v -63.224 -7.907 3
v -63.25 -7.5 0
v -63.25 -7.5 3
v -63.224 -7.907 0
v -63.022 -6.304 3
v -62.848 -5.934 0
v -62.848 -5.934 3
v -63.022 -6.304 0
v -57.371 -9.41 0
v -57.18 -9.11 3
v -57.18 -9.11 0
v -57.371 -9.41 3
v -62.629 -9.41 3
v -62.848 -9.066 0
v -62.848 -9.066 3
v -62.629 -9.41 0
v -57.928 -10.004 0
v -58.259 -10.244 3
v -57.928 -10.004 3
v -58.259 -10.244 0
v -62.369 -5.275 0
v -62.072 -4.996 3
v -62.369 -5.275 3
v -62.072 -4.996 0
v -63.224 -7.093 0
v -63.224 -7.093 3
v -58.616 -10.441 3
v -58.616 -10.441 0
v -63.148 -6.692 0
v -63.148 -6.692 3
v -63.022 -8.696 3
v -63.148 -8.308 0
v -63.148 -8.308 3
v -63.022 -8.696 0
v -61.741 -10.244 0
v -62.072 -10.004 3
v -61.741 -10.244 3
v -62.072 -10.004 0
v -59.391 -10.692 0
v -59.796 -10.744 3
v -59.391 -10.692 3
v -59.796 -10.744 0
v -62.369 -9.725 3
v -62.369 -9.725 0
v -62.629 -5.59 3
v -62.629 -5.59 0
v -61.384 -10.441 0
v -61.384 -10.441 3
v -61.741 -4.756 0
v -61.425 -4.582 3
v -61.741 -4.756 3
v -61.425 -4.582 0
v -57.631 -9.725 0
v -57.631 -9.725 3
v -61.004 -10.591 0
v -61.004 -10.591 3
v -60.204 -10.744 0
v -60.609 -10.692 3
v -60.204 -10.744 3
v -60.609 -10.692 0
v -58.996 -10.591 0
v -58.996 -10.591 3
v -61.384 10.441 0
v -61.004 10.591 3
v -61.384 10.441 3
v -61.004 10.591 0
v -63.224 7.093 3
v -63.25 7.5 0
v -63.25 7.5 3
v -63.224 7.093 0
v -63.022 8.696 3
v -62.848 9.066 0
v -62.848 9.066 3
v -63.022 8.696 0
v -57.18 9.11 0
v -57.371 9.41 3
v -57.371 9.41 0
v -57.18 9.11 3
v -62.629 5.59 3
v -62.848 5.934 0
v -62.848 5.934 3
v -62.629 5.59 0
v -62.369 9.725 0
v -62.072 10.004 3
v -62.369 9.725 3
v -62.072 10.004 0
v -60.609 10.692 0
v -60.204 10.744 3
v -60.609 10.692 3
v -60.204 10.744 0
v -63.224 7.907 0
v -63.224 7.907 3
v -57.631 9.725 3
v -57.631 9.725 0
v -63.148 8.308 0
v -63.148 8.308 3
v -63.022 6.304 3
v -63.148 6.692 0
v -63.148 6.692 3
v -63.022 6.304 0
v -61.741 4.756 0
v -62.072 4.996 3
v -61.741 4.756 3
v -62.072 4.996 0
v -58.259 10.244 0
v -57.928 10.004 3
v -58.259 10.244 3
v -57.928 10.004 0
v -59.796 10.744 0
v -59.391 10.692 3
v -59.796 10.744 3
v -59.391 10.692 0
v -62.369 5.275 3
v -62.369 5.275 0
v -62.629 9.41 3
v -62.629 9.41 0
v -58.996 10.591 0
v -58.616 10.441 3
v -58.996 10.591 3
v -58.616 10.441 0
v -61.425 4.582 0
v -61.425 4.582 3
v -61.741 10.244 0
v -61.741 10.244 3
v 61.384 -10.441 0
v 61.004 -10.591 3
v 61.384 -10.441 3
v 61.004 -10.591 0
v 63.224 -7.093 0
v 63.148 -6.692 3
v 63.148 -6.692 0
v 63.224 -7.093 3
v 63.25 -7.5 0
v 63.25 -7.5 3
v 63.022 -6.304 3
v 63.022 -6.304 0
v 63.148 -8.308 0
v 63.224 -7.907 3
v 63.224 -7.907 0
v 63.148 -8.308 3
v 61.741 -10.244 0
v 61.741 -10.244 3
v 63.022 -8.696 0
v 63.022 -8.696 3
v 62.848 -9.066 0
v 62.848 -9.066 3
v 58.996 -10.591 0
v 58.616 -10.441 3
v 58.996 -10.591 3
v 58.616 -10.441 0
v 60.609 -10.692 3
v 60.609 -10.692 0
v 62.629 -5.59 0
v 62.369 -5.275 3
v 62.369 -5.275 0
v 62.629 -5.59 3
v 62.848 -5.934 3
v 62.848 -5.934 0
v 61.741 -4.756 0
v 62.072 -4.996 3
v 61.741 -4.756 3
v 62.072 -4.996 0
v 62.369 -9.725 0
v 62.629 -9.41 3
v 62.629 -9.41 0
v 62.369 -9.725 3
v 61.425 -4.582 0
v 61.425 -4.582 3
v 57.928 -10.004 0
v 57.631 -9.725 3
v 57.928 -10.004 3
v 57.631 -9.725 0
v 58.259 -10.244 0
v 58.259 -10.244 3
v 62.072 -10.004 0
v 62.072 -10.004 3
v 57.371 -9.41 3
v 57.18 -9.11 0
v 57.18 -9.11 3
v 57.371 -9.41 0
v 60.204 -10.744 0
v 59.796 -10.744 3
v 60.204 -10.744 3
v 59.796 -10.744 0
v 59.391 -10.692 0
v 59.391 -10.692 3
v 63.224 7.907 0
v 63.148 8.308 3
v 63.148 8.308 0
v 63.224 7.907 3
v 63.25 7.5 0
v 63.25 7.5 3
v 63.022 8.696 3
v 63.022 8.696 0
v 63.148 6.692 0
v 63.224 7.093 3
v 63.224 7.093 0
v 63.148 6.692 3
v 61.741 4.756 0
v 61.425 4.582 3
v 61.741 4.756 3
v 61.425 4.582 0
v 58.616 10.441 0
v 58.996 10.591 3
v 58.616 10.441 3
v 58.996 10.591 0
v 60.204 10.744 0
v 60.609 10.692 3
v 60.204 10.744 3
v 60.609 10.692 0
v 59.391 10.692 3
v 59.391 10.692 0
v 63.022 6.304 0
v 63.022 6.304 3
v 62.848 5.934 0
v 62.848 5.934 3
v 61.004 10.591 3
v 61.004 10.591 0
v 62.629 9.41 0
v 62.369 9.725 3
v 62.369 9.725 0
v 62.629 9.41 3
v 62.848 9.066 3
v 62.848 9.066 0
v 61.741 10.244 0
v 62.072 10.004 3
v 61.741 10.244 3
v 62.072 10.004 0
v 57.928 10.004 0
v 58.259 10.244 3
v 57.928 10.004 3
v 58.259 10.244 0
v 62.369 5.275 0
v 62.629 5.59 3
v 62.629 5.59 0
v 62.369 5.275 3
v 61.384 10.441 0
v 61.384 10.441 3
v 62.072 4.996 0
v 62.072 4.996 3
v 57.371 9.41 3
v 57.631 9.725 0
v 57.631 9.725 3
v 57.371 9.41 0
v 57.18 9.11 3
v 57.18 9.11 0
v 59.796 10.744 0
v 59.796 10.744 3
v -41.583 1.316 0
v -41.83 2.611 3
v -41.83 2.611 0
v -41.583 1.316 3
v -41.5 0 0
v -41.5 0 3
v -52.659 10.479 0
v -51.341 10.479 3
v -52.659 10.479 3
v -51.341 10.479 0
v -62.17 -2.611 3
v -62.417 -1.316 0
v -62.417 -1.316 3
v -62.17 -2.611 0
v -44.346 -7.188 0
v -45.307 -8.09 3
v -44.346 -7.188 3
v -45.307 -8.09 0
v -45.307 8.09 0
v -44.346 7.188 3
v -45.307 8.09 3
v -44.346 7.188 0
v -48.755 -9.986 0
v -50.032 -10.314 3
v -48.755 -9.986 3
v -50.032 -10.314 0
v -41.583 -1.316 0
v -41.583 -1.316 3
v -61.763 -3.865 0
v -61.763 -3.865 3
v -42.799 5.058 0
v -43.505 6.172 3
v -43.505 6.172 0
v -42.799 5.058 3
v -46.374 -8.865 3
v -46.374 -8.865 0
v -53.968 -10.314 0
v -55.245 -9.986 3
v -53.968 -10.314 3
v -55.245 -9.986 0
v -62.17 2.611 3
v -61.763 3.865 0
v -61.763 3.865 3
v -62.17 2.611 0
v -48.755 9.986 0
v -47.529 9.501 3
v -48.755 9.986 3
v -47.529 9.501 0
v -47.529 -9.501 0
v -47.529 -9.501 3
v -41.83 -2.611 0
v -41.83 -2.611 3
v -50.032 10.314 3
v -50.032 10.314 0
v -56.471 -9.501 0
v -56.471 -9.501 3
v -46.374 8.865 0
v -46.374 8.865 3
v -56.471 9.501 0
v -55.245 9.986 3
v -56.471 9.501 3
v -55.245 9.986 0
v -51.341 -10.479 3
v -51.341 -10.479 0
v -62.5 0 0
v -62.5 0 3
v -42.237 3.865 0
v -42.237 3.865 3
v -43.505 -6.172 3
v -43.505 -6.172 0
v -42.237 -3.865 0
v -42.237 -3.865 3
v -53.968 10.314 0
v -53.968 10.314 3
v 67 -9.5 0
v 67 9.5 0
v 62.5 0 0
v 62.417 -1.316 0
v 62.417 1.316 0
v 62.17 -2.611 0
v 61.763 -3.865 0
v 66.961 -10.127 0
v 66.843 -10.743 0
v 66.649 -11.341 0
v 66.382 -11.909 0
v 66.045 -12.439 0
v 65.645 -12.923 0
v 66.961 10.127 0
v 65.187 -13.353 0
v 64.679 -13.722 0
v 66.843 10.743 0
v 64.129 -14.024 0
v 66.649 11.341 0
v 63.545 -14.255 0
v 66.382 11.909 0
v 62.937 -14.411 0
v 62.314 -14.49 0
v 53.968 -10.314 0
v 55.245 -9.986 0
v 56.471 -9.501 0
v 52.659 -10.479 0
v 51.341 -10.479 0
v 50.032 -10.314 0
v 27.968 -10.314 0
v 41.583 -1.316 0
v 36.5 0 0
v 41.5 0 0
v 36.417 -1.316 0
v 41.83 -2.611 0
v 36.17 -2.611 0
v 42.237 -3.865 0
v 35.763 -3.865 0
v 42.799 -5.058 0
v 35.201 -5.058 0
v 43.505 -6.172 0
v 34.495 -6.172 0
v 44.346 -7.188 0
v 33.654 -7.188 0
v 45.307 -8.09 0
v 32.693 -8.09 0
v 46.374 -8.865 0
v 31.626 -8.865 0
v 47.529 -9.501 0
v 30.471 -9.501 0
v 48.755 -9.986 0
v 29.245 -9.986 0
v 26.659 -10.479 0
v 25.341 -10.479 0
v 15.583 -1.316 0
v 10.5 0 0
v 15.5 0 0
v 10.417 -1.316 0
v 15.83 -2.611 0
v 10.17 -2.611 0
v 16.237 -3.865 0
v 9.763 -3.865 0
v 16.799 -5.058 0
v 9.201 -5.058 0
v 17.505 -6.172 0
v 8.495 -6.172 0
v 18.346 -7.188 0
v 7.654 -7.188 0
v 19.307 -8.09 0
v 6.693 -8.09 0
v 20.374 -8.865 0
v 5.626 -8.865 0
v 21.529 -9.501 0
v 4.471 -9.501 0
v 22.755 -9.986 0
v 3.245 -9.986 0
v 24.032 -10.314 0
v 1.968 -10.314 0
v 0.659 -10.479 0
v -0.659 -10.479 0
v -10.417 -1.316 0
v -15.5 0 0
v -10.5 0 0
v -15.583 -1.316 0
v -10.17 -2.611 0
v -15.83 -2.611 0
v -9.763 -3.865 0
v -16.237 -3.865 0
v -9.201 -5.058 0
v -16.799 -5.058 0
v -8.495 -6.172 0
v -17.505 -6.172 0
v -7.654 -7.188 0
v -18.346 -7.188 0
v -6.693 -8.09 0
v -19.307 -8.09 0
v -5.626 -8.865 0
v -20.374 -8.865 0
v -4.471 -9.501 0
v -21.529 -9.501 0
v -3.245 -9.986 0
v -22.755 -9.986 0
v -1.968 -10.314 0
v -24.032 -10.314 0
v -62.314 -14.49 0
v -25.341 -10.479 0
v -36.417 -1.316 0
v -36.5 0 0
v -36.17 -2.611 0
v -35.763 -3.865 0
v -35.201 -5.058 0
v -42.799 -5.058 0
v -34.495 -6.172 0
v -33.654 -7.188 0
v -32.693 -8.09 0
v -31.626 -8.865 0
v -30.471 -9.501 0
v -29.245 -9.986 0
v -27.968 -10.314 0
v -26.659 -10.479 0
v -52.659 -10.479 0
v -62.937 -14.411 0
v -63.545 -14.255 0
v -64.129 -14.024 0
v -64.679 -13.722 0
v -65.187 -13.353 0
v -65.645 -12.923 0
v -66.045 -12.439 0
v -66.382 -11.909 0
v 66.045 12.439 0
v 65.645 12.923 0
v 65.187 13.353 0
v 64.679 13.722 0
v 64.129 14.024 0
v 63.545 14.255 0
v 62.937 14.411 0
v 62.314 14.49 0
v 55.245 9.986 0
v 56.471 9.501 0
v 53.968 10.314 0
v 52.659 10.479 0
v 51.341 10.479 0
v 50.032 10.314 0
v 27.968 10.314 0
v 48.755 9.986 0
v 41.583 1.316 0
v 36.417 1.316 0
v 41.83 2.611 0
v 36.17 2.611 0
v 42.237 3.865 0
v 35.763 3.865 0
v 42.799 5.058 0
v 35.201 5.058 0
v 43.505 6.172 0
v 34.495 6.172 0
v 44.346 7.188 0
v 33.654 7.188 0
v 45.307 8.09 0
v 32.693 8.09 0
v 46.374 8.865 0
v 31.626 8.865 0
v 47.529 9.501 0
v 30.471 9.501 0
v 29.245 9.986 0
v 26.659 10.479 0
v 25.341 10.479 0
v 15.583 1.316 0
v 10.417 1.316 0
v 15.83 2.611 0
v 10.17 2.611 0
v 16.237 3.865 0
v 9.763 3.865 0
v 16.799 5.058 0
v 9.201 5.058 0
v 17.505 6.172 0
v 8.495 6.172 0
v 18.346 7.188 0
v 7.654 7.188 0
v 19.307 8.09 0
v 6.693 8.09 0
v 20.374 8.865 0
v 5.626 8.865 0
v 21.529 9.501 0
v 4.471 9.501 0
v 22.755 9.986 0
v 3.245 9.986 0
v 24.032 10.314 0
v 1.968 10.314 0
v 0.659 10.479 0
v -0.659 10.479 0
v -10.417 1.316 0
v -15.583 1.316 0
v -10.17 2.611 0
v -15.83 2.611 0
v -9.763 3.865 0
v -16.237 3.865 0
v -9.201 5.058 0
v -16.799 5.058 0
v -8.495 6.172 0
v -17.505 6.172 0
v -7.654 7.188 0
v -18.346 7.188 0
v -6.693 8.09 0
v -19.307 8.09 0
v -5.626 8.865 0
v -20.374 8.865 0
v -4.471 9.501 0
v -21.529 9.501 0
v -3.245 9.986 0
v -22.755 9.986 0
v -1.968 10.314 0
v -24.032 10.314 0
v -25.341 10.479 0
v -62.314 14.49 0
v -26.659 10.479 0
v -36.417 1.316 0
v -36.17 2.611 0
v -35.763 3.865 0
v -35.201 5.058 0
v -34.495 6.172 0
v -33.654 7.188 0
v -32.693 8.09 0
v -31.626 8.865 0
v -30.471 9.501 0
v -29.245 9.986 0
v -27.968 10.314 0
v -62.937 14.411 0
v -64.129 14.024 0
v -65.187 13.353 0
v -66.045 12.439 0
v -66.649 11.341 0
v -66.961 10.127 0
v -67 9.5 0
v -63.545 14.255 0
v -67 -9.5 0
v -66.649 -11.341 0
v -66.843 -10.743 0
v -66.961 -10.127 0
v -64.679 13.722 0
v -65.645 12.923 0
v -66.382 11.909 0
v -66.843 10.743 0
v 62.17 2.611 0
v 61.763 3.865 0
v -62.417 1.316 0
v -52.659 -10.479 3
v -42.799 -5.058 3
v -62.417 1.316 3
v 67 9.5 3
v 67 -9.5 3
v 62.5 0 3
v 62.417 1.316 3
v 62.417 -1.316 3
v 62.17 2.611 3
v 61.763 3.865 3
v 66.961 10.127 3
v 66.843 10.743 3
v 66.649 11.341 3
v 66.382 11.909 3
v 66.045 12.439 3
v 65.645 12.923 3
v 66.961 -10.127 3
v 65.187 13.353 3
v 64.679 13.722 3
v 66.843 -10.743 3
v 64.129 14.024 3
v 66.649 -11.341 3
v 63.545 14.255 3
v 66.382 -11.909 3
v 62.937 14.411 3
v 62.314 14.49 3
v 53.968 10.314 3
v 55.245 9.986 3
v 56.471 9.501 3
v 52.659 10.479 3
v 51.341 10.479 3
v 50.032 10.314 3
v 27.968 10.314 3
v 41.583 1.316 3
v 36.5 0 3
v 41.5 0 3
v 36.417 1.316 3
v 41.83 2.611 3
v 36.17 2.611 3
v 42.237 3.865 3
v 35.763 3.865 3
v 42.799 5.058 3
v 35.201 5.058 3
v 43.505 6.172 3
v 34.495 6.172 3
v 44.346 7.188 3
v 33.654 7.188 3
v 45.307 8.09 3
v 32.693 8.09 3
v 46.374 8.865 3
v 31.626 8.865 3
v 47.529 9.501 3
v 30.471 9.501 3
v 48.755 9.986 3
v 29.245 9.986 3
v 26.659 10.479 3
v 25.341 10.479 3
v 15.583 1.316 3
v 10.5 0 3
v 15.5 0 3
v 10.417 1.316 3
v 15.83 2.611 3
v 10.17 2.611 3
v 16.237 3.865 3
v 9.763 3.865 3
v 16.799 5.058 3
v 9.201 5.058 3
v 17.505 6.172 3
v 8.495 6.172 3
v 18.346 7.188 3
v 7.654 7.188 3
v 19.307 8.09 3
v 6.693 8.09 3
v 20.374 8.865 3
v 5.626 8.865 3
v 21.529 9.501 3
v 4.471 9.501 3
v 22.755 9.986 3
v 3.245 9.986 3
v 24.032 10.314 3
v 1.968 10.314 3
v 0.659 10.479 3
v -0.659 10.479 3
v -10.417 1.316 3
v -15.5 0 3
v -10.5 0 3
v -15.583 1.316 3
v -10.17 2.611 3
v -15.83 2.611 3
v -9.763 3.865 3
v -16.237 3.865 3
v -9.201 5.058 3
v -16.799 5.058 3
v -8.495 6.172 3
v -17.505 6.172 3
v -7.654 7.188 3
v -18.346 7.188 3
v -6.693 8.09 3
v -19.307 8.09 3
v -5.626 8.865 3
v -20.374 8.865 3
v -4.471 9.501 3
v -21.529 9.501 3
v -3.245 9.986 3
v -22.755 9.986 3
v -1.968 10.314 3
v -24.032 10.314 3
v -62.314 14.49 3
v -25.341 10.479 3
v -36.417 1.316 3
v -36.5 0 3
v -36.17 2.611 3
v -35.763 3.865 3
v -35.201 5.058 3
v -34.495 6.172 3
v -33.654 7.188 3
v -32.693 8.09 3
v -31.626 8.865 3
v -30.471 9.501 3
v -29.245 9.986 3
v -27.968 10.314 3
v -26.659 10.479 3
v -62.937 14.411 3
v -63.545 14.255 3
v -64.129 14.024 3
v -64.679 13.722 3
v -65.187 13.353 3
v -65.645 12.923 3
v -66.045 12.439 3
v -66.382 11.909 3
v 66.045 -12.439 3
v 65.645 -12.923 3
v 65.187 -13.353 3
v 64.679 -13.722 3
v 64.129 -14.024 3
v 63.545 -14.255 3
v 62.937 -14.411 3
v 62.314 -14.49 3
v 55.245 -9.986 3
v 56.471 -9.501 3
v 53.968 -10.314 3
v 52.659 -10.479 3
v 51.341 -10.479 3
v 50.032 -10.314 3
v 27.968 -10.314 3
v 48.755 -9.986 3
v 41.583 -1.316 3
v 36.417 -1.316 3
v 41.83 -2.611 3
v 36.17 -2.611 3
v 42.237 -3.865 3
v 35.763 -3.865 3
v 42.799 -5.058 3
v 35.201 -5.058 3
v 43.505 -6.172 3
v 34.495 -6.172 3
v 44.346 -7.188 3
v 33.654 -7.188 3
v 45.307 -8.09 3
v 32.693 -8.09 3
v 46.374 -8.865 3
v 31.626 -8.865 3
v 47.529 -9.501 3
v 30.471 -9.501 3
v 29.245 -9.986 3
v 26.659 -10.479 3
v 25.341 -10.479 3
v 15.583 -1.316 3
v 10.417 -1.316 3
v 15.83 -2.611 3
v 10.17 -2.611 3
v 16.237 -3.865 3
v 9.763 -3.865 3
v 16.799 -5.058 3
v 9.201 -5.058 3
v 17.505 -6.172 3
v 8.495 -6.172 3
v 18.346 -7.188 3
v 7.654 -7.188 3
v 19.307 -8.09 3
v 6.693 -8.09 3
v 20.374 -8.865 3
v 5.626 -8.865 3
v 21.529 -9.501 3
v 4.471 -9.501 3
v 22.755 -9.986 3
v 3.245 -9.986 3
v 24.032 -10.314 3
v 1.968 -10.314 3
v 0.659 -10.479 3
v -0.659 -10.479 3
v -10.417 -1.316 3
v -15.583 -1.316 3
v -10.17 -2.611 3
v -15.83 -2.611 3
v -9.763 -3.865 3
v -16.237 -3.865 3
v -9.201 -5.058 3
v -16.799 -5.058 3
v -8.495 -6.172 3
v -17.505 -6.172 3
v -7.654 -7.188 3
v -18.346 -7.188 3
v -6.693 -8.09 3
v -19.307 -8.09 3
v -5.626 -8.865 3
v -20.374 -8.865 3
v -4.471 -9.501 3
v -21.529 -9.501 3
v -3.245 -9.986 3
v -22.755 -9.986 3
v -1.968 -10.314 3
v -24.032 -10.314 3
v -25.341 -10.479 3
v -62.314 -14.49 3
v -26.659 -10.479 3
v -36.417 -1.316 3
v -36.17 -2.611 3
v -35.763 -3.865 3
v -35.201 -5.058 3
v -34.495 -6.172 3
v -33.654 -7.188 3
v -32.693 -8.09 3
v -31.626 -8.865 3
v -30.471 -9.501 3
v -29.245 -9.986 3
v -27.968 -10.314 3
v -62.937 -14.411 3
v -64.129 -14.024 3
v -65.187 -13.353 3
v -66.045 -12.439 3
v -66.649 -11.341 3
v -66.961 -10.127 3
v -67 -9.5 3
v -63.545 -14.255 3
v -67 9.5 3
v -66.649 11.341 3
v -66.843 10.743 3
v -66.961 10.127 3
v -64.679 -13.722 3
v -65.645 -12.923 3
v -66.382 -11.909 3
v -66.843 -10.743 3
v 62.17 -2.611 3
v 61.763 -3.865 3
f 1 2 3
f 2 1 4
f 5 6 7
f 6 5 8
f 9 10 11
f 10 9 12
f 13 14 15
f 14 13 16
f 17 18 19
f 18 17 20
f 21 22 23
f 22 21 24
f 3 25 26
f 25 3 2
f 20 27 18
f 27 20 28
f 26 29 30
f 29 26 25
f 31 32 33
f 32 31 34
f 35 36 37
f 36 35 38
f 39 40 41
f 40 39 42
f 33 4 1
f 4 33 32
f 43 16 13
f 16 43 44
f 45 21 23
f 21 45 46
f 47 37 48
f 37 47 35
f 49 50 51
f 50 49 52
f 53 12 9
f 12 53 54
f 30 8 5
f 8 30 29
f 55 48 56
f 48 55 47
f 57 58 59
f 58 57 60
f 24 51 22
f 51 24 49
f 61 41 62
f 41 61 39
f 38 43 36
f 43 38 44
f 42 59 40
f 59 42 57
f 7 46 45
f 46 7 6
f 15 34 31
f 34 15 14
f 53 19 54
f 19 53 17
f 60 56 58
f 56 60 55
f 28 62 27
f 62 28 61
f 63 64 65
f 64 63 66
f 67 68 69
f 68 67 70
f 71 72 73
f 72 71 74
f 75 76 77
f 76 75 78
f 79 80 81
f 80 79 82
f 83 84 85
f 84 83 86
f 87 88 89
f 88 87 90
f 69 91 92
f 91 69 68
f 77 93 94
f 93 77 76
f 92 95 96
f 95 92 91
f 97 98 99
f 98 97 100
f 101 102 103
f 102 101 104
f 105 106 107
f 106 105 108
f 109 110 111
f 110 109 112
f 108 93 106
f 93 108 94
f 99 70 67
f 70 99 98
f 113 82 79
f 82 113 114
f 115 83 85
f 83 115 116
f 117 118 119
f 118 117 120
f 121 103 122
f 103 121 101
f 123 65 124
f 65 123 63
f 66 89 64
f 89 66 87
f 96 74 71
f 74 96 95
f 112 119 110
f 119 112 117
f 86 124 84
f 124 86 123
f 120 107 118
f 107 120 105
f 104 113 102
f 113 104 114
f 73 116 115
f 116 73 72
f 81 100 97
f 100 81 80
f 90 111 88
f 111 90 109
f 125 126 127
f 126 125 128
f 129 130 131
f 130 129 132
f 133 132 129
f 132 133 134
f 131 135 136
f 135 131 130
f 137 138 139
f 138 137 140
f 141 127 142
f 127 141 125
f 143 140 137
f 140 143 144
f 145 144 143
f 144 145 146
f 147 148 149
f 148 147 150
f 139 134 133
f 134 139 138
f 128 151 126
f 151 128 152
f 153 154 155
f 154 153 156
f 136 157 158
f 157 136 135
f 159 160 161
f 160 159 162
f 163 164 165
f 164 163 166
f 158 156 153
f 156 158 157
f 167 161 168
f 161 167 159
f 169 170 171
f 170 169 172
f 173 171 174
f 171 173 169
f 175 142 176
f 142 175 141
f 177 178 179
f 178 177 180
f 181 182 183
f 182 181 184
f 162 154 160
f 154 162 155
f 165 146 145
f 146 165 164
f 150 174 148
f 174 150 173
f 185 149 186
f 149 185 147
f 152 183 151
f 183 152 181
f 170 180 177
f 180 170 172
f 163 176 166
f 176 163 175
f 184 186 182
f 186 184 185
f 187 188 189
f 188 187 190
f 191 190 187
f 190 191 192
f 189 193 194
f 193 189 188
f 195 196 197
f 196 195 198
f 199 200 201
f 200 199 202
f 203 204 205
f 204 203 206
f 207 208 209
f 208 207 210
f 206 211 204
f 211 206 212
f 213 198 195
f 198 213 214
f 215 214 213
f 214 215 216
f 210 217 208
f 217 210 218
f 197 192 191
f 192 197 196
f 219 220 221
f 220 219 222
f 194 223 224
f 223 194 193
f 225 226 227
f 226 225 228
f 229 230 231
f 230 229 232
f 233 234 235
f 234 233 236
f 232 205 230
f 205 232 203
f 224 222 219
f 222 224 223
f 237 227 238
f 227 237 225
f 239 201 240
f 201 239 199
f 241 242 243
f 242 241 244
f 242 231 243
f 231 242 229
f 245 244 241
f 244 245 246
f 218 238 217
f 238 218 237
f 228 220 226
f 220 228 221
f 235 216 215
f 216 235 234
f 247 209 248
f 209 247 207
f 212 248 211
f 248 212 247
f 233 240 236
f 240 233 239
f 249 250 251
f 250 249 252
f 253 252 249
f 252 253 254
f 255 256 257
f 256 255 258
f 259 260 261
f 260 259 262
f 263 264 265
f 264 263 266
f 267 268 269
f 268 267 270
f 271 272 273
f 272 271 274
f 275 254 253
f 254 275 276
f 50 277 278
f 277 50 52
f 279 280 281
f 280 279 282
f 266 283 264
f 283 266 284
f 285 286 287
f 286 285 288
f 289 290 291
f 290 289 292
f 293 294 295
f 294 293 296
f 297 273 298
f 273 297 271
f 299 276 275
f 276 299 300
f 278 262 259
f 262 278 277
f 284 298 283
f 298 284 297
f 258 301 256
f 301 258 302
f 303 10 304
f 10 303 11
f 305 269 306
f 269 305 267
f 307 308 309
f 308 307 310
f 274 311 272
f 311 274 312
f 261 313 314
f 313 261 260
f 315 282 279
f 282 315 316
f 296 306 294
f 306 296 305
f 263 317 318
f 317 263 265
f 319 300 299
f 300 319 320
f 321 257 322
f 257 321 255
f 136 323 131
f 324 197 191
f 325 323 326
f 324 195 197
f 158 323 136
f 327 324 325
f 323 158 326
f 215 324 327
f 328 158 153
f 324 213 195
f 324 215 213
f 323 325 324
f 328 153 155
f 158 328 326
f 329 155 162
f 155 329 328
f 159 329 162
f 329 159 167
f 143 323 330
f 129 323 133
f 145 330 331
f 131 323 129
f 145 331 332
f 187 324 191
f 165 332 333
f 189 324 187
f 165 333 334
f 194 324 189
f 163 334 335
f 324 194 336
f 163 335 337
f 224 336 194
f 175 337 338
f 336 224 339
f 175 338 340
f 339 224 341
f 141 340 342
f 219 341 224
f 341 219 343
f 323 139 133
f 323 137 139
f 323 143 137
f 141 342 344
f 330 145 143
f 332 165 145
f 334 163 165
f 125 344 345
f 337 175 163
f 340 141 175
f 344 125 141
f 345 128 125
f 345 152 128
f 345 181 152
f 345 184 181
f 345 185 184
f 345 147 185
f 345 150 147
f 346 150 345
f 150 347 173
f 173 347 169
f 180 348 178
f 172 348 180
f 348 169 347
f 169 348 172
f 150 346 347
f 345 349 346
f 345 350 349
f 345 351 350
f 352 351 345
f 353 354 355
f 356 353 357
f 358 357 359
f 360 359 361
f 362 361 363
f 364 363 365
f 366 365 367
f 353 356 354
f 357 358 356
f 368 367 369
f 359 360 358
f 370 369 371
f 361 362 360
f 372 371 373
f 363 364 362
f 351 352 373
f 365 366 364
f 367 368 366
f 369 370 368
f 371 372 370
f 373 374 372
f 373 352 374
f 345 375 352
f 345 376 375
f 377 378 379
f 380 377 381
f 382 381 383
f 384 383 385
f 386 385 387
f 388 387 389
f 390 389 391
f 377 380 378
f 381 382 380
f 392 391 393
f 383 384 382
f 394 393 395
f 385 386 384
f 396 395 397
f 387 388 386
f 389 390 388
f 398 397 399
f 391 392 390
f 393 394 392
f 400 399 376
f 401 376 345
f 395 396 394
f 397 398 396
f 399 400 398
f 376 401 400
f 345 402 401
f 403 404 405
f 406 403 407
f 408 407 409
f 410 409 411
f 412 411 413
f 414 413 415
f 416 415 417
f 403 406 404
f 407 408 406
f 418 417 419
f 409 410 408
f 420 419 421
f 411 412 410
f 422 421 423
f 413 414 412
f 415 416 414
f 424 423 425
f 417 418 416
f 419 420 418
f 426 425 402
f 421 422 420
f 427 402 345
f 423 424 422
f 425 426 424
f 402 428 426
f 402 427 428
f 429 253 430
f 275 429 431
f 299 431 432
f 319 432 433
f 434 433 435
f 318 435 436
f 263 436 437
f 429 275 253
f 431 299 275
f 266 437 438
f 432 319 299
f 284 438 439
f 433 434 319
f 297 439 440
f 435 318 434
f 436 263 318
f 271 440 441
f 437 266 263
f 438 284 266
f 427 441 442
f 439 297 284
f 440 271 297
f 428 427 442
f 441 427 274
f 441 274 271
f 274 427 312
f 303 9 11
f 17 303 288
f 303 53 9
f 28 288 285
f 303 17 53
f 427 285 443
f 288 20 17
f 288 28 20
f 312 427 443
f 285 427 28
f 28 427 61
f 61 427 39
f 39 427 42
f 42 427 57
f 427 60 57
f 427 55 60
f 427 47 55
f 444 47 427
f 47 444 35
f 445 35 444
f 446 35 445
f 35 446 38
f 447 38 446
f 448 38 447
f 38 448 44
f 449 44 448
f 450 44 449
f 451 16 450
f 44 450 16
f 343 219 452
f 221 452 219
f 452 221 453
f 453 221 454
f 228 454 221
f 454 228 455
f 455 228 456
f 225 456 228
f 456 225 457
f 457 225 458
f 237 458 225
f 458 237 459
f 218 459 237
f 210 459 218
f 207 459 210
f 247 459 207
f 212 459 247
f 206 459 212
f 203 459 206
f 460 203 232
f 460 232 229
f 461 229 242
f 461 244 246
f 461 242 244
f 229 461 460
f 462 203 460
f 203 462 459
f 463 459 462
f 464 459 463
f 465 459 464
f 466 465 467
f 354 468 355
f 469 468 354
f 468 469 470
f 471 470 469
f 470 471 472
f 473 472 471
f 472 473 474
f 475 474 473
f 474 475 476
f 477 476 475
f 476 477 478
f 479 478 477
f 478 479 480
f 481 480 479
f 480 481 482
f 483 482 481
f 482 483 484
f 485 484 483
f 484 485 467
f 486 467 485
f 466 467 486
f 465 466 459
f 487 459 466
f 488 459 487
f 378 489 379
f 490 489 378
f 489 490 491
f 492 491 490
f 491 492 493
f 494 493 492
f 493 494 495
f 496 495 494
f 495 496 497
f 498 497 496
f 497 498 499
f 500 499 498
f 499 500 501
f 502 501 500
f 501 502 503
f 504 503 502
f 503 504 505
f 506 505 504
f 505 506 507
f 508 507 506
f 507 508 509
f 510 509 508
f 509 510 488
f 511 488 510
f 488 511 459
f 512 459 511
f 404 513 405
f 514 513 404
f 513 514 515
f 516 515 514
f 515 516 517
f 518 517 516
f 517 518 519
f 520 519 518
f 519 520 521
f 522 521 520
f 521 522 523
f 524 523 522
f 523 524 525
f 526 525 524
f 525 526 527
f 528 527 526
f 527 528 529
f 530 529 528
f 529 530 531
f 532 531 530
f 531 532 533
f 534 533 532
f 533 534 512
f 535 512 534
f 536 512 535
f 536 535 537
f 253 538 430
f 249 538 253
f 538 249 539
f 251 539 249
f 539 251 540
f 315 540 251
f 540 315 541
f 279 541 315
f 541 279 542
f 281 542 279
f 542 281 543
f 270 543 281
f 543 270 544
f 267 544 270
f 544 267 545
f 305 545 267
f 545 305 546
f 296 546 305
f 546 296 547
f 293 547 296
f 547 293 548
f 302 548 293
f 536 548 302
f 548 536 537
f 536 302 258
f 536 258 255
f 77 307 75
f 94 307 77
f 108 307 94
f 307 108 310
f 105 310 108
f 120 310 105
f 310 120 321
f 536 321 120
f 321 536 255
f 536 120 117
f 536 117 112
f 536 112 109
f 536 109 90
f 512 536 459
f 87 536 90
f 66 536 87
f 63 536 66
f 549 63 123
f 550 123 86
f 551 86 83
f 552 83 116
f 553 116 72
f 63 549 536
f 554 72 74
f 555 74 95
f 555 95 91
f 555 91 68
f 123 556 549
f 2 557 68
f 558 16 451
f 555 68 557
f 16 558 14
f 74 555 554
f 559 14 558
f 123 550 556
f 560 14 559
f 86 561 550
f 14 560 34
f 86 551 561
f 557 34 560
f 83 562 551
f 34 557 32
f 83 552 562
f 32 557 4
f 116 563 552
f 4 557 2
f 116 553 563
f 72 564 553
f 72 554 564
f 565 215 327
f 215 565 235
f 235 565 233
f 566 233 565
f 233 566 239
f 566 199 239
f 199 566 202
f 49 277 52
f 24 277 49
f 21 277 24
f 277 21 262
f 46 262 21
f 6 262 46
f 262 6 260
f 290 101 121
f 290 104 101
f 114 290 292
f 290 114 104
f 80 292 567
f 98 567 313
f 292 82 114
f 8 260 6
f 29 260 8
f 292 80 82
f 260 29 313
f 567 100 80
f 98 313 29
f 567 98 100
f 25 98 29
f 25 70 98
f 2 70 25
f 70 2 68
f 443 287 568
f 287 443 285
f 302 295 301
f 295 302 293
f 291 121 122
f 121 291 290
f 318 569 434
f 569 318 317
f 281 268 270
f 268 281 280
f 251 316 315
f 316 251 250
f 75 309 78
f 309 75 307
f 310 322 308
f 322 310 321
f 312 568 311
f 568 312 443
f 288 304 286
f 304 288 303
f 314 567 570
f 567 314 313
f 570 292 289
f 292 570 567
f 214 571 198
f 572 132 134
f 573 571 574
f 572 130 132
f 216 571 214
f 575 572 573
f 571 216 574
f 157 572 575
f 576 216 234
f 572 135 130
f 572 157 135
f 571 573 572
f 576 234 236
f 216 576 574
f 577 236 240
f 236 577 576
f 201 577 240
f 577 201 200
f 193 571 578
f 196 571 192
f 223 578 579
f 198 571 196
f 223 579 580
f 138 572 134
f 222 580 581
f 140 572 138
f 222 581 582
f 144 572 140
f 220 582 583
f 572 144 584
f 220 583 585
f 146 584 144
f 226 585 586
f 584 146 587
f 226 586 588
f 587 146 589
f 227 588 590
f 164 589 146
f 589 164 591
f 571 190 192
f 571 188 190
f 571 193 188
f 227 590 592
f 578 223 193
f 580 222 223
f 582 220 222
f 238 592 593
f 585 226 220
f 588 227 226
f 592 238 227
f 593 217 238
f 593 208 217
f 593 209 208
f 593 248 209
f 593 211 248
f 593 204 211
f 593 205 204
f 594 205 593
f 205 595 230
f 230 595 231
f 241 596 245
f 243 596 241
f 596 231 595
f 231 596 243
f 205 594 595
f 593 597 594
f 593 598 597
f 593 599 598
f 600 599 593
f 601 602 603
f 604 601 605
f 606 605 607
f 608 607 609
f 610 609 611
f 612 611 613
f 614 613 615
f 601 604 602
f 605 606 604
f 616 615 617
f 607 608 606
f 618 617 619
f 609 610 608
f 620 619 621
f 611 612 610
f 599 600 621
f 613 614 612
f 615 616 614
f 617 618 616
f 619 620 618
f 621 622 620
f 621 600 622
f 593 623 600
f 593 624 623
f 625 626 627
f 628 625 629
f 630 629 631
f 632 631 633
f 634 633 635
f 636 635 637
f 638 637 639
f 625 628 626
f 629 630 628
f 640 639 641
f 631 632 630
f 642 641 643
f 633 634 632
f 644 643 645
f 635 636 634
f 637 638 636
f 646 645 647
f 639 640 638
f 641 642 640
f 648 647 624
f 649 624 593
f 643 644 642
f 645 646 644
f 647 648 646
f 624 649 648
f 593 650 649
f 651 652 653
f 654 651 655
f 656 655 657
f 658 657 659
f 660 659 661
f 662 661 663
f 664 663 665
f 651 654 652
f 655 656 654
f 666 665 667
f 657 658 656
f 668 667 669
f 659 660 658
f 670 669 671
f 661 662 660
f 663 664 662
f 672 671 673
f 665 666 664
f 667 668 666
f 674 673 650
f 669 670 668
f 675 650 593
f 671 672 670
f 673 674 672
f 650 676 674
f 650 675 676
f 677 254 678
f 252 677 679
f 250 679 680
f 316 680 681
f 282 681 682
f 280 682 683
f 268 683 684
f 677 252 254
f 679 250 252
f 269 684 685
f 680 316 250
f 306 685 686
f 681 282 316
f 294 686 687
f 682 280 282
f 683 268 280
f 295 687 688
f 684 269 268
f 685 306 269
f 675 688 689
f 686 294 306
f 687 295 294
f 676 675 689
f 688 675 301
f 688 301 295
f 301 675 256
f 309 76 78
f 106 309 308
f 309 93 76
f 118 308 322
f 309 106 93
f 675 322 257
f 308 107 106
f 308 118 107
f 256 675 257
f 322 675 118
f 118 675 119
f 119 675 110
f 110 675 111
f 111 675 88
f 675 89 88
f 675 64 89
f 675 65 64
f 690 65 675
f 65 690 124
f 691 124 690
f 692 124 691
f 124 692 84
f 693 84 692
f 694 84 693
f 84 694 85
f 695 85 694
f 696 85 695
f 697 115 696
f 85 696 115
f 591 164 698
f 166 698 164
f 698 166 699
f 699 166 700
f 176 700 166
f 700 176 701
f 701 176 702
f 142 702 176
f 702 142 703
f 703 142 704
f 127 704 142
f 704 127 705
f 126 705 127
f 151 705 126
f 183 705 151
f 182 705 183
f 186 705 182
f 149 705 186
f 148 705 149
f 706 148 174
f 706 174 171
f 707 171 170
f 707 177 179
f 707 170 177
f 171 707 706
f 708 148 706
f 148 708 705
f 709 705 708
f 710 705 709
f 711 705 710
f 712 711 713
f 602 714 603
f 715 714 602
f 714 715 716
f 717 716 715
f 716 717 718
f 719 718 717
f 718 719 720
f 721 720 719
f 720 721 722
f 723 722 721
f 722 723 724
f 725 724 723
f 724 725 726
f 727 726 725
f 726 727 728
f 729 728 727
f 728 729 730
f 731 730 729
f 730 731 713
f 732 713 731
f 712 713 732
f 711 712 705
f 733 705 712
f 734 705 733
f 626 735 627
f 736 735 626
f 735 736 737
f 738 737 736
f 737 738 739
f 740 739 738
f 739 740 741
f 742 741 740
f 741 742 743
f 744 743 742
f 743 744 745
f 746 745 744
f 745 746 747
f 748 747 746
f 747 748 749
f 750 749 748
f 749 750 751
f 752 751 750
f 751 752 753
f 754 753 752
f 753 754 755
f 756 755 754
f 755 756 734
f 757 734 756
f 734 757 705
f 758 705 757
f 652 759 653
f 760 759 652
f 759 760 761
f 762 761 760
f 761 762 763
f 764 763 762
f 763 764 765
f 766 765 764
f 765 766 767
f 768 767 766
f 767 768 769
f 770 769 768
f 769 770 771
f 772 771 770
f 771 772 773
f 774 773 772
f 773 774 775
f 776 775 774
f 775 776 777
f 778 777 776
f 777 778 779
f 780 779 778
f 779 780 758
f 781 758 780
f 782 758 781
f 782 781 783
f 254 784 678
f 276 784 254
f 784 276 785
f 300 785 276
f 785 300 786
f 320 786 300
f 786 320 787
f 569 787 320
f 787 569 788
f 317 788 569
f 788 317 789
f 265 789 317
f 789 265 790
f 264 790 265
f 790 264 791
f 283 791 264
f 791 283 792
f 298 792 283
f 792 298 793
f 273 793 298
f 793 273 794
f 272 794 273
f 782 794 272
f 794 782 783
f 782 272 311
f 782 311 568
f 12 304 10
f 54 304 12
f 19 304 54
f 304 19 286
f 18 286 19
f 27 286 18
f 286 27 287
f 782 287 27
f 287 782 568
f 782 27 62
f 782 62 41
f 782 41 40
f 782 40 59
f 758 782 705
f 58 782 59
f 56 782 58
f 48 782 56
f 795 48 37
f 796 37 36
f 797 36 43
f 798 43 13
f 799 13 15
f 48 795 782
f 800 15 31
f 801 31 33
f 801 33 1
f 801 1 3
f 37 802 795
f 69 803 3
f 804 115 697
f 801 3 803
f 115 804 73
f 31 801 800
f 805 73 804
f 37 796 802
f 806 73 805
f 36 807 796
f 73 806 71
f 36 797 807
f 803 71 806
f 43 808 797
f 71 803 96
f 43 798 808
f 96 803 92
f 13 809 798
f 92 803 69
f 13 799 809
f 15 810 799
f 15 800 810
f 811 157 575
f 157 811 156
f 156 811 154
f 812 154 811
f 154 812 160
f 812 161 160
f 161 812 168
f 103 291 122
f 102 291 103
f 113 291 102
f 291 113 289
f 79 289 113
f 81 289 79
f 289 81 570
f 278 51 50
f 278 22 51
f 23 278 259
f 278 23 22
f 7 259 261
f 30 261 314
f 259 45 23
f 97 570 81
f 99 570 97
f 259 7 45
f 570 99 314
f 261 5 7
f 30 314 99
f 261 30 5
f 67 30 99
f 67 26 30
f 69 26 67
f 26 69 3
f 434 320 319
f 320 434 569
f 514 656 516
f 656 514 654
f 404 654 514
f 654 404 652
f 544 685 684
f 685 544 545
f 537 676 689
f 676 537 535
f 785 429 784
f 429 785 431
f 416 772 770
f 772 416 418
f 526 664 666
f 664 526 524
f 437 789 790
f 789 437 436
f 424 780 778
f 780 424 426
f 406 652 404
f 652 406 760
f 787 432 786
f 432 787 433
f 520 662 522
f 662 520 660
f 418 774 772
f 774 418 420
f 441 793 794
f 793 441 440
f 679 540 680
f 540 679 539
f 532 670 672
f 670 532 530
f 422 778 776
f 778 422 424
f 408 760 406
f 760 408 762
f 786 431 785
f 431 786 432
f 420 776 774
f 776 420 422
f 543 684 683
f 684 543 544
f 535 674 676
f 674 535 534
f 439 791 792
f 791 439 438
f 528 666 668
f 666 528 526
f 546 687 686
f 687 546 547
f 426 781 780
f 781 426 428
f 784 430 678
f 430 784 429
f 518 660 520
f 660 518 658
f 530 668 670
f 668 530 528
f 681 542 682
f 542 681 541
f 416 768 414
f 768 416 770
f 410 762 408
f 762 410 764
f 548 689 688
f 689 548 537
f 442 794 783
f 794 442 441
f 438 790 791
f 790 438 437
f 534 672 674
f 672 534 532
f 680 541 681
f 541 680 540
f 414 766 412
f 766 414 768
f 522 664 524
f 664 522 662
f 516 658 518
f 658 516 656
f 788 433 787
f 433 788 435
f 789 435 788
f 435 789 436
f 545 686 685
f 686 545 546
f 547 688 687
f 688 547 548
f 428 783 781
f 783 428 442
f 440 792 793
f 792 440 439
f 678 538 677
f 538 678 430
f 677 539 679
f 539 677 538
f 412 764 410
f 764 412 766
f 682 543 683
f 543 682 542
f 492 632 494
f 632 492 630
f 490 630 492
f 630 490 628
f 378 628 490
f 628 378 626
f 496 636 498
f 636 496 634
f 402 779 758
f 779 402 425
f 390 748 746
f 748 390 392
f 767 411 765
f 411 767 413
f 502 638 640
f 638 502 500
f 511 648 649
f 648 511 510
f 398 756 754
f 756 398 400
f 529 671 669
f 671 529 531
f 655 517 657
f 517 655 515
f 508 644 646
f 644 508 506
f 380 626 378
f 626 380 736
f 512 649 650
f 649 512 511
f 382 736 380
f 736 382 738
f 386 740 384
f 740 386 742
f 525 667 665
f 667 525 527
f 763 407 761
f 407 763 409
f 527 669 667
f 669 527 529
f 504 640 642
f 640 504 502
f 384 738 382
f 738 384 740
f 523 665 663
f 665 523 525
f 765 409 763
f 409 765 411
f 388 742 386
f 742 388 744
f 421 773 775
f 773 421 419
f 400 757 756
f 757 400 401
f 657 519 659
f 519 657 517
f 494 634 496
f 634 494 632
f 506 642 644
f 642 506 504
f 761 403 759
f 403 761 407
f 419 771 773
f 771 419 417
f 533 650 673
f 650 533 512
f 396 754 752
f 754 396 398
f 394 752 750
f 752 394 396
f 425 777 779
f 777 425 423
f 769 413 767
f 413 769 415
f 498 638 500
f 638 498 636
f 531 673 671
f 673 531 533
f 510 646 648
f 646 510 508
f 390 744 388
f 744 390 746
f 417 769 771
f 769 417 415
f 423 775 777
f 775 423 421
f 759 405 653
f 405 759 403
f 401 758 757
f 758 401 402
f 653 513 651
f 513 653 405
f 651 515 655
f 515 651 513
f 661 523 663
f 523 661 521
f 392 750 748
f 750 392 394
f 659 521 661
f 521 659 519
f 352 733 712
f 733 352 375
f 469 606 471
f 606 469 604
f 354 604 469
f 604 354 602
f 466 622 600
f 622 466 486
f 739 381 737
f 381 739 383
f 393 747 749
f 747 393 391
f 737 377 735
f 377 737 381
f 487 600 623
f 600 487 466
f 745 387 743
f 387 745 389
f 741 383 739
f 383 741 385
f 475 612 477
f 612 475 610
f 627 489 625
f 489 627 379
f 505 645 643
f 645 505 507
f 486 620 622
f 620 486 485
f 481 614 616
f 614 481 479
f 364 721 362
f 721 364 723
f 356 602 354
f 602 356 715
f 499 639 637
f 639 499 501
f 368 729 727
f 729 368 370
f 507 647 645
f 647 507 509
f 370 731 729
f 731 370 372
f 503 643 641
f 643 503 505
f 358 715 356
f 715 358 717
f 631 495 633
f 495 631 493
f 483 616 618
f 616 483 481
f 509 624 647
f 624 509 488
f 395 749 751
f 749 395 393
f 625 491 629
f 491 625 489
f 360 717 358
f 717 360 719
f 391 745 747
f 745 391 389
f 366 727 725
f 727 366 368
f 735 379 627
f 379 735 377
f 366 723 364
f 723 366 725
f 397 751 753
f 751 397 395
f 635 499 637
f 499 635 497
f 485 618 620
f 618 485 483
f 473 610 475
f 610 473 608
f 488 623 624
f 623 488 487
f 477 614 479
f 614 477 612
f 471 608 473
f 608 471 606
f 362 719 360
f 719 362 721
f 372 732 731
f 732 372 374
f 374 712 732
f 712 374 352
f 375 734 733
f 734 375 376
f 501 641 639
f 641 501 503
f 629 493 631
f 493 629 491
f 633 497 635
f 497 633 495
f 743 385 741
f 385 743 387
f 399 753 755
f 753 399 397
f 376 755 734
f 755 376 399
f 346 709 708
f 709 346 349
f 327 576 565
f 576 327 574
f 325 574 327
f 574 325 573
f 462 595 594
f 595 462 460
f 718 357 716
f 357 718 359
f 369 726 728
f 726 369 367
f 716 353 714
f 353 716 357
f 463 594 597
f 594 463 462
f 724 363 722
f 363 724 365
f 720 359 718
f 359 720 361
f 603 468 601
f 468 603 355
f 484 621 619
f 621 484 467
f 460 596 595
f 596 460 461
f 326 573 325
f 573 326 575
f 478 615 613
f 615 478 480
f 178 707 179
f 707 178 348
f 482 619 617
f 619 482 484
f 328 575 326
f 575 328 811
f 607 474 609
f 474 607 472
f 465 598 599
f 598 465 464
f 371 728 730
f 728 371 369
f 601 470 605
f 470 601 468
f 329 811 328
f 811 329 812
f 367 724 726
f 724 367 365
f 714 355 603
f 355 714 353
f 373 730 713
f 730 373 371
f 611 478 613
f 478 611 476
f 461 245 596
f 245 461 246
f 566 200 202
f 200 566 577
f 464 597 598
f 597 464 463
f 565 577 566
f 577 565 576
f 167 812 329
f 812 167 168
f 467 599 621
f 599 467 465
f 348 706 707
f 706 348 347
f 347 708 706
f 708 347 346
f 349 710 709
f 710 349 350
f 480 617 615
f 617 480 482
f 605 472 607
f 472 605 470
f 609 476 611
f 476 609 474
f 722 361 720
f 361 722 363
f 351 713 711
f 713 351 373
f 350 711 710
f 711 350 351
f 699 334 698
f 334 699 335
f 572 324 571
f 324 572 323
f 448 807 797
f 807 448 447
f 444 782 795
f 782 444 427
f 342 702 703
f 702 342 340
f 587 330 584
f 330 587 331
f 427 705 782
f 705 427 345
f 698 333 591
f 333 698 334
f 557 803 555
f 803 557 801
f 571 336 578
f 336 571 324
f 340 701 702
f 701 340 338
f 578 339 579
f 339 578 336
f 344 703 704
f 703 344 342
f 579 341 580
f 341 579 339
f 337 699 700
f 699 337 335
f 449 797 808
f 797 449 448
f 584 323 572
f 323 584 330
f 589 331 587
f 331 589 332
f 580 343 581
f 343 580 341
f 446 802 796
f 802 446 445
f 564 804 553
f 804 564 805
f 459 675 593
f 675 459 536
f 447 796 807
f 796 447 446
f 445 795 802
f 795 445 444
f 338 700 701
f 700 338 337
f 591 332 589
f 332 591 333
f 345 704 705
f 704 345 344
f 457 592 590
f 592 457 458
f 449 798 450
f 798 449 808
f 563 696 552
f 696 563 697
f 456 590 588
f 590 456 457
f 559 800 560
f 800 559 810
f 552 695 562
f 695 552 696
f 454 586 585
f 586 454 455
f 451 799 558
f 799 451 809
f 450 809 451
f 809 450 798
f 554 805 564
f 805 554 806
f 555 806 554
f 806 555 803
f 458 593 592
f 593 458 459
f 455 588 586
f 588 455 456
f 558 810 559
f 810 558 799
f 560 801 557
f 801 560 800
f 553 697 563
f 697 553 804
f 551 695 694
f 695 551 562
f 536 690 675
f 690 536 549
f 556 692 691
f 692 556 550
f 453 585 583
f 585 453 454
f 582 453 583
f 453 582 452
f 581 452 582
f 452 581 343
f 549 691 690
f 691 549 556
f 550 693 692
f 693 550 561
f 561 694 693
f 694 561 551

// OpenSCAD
$fn = 50;


difference() {
	union() {
		hull() {
			translate(v = [-62.0000000000, 9.5000000000, 0]) {
				cylinder(h = 3, r = 5);
			}
			translate(v = [62.0000000000, 9.5000000000, 0]) {
				cylinder(h = 3, r = 5);
			}
			translate(v = [-62.0000000000, -9.5000000000, 0]) {
				cylinder(h = 3, r = 5);
			}
			translate(v = [62.0000000000, -9.5000000000, 0]) {
				cylinder(h = 3, r = 5);
			}
		}
	}
	union() {
		#translate(v = [-60.0000000000, -7.5000000000, -100.0000000000]) {
			cylinder(h = 200, r = 3.2500000000);
		}
		#translate(v = [-60.0000000000, 7.5000000000, -100.0000000000]) {
			cylinder(h = 200, r = 3.2500000000);
		}
		#translate(v = [60.0000000000, -7.5000000000, -100.0000000000]) {
			cylinder(h = 200, r = 3.2500000000);
		}
		#translate(v = [60.0000000000, 7.5000000000, -100.0000000000]) {
			cylinder(h = 200, r = 3.2500000000);
		}
		#translate(v = [-52.0000000000, 0, 0]) {
			cylinder(h = 3, r = 10.5000000000);
		}
		#translate(v = [-26.0000000000, 0, 0]) {
			cylinder(h = 3, r = 10.5000000000);
		}
		#cylinder(h = 3, r = 10.5000000000);
		#translate(v = [26.0000000000, 0, 0]) {
			cylinder(h = 3, r = 10.5000000000);
		}
		#translate(v = [52.0000000000, 0, 0]) {
			cylinder(h = 3, r = 10.5000000000);
		}
	}
}
